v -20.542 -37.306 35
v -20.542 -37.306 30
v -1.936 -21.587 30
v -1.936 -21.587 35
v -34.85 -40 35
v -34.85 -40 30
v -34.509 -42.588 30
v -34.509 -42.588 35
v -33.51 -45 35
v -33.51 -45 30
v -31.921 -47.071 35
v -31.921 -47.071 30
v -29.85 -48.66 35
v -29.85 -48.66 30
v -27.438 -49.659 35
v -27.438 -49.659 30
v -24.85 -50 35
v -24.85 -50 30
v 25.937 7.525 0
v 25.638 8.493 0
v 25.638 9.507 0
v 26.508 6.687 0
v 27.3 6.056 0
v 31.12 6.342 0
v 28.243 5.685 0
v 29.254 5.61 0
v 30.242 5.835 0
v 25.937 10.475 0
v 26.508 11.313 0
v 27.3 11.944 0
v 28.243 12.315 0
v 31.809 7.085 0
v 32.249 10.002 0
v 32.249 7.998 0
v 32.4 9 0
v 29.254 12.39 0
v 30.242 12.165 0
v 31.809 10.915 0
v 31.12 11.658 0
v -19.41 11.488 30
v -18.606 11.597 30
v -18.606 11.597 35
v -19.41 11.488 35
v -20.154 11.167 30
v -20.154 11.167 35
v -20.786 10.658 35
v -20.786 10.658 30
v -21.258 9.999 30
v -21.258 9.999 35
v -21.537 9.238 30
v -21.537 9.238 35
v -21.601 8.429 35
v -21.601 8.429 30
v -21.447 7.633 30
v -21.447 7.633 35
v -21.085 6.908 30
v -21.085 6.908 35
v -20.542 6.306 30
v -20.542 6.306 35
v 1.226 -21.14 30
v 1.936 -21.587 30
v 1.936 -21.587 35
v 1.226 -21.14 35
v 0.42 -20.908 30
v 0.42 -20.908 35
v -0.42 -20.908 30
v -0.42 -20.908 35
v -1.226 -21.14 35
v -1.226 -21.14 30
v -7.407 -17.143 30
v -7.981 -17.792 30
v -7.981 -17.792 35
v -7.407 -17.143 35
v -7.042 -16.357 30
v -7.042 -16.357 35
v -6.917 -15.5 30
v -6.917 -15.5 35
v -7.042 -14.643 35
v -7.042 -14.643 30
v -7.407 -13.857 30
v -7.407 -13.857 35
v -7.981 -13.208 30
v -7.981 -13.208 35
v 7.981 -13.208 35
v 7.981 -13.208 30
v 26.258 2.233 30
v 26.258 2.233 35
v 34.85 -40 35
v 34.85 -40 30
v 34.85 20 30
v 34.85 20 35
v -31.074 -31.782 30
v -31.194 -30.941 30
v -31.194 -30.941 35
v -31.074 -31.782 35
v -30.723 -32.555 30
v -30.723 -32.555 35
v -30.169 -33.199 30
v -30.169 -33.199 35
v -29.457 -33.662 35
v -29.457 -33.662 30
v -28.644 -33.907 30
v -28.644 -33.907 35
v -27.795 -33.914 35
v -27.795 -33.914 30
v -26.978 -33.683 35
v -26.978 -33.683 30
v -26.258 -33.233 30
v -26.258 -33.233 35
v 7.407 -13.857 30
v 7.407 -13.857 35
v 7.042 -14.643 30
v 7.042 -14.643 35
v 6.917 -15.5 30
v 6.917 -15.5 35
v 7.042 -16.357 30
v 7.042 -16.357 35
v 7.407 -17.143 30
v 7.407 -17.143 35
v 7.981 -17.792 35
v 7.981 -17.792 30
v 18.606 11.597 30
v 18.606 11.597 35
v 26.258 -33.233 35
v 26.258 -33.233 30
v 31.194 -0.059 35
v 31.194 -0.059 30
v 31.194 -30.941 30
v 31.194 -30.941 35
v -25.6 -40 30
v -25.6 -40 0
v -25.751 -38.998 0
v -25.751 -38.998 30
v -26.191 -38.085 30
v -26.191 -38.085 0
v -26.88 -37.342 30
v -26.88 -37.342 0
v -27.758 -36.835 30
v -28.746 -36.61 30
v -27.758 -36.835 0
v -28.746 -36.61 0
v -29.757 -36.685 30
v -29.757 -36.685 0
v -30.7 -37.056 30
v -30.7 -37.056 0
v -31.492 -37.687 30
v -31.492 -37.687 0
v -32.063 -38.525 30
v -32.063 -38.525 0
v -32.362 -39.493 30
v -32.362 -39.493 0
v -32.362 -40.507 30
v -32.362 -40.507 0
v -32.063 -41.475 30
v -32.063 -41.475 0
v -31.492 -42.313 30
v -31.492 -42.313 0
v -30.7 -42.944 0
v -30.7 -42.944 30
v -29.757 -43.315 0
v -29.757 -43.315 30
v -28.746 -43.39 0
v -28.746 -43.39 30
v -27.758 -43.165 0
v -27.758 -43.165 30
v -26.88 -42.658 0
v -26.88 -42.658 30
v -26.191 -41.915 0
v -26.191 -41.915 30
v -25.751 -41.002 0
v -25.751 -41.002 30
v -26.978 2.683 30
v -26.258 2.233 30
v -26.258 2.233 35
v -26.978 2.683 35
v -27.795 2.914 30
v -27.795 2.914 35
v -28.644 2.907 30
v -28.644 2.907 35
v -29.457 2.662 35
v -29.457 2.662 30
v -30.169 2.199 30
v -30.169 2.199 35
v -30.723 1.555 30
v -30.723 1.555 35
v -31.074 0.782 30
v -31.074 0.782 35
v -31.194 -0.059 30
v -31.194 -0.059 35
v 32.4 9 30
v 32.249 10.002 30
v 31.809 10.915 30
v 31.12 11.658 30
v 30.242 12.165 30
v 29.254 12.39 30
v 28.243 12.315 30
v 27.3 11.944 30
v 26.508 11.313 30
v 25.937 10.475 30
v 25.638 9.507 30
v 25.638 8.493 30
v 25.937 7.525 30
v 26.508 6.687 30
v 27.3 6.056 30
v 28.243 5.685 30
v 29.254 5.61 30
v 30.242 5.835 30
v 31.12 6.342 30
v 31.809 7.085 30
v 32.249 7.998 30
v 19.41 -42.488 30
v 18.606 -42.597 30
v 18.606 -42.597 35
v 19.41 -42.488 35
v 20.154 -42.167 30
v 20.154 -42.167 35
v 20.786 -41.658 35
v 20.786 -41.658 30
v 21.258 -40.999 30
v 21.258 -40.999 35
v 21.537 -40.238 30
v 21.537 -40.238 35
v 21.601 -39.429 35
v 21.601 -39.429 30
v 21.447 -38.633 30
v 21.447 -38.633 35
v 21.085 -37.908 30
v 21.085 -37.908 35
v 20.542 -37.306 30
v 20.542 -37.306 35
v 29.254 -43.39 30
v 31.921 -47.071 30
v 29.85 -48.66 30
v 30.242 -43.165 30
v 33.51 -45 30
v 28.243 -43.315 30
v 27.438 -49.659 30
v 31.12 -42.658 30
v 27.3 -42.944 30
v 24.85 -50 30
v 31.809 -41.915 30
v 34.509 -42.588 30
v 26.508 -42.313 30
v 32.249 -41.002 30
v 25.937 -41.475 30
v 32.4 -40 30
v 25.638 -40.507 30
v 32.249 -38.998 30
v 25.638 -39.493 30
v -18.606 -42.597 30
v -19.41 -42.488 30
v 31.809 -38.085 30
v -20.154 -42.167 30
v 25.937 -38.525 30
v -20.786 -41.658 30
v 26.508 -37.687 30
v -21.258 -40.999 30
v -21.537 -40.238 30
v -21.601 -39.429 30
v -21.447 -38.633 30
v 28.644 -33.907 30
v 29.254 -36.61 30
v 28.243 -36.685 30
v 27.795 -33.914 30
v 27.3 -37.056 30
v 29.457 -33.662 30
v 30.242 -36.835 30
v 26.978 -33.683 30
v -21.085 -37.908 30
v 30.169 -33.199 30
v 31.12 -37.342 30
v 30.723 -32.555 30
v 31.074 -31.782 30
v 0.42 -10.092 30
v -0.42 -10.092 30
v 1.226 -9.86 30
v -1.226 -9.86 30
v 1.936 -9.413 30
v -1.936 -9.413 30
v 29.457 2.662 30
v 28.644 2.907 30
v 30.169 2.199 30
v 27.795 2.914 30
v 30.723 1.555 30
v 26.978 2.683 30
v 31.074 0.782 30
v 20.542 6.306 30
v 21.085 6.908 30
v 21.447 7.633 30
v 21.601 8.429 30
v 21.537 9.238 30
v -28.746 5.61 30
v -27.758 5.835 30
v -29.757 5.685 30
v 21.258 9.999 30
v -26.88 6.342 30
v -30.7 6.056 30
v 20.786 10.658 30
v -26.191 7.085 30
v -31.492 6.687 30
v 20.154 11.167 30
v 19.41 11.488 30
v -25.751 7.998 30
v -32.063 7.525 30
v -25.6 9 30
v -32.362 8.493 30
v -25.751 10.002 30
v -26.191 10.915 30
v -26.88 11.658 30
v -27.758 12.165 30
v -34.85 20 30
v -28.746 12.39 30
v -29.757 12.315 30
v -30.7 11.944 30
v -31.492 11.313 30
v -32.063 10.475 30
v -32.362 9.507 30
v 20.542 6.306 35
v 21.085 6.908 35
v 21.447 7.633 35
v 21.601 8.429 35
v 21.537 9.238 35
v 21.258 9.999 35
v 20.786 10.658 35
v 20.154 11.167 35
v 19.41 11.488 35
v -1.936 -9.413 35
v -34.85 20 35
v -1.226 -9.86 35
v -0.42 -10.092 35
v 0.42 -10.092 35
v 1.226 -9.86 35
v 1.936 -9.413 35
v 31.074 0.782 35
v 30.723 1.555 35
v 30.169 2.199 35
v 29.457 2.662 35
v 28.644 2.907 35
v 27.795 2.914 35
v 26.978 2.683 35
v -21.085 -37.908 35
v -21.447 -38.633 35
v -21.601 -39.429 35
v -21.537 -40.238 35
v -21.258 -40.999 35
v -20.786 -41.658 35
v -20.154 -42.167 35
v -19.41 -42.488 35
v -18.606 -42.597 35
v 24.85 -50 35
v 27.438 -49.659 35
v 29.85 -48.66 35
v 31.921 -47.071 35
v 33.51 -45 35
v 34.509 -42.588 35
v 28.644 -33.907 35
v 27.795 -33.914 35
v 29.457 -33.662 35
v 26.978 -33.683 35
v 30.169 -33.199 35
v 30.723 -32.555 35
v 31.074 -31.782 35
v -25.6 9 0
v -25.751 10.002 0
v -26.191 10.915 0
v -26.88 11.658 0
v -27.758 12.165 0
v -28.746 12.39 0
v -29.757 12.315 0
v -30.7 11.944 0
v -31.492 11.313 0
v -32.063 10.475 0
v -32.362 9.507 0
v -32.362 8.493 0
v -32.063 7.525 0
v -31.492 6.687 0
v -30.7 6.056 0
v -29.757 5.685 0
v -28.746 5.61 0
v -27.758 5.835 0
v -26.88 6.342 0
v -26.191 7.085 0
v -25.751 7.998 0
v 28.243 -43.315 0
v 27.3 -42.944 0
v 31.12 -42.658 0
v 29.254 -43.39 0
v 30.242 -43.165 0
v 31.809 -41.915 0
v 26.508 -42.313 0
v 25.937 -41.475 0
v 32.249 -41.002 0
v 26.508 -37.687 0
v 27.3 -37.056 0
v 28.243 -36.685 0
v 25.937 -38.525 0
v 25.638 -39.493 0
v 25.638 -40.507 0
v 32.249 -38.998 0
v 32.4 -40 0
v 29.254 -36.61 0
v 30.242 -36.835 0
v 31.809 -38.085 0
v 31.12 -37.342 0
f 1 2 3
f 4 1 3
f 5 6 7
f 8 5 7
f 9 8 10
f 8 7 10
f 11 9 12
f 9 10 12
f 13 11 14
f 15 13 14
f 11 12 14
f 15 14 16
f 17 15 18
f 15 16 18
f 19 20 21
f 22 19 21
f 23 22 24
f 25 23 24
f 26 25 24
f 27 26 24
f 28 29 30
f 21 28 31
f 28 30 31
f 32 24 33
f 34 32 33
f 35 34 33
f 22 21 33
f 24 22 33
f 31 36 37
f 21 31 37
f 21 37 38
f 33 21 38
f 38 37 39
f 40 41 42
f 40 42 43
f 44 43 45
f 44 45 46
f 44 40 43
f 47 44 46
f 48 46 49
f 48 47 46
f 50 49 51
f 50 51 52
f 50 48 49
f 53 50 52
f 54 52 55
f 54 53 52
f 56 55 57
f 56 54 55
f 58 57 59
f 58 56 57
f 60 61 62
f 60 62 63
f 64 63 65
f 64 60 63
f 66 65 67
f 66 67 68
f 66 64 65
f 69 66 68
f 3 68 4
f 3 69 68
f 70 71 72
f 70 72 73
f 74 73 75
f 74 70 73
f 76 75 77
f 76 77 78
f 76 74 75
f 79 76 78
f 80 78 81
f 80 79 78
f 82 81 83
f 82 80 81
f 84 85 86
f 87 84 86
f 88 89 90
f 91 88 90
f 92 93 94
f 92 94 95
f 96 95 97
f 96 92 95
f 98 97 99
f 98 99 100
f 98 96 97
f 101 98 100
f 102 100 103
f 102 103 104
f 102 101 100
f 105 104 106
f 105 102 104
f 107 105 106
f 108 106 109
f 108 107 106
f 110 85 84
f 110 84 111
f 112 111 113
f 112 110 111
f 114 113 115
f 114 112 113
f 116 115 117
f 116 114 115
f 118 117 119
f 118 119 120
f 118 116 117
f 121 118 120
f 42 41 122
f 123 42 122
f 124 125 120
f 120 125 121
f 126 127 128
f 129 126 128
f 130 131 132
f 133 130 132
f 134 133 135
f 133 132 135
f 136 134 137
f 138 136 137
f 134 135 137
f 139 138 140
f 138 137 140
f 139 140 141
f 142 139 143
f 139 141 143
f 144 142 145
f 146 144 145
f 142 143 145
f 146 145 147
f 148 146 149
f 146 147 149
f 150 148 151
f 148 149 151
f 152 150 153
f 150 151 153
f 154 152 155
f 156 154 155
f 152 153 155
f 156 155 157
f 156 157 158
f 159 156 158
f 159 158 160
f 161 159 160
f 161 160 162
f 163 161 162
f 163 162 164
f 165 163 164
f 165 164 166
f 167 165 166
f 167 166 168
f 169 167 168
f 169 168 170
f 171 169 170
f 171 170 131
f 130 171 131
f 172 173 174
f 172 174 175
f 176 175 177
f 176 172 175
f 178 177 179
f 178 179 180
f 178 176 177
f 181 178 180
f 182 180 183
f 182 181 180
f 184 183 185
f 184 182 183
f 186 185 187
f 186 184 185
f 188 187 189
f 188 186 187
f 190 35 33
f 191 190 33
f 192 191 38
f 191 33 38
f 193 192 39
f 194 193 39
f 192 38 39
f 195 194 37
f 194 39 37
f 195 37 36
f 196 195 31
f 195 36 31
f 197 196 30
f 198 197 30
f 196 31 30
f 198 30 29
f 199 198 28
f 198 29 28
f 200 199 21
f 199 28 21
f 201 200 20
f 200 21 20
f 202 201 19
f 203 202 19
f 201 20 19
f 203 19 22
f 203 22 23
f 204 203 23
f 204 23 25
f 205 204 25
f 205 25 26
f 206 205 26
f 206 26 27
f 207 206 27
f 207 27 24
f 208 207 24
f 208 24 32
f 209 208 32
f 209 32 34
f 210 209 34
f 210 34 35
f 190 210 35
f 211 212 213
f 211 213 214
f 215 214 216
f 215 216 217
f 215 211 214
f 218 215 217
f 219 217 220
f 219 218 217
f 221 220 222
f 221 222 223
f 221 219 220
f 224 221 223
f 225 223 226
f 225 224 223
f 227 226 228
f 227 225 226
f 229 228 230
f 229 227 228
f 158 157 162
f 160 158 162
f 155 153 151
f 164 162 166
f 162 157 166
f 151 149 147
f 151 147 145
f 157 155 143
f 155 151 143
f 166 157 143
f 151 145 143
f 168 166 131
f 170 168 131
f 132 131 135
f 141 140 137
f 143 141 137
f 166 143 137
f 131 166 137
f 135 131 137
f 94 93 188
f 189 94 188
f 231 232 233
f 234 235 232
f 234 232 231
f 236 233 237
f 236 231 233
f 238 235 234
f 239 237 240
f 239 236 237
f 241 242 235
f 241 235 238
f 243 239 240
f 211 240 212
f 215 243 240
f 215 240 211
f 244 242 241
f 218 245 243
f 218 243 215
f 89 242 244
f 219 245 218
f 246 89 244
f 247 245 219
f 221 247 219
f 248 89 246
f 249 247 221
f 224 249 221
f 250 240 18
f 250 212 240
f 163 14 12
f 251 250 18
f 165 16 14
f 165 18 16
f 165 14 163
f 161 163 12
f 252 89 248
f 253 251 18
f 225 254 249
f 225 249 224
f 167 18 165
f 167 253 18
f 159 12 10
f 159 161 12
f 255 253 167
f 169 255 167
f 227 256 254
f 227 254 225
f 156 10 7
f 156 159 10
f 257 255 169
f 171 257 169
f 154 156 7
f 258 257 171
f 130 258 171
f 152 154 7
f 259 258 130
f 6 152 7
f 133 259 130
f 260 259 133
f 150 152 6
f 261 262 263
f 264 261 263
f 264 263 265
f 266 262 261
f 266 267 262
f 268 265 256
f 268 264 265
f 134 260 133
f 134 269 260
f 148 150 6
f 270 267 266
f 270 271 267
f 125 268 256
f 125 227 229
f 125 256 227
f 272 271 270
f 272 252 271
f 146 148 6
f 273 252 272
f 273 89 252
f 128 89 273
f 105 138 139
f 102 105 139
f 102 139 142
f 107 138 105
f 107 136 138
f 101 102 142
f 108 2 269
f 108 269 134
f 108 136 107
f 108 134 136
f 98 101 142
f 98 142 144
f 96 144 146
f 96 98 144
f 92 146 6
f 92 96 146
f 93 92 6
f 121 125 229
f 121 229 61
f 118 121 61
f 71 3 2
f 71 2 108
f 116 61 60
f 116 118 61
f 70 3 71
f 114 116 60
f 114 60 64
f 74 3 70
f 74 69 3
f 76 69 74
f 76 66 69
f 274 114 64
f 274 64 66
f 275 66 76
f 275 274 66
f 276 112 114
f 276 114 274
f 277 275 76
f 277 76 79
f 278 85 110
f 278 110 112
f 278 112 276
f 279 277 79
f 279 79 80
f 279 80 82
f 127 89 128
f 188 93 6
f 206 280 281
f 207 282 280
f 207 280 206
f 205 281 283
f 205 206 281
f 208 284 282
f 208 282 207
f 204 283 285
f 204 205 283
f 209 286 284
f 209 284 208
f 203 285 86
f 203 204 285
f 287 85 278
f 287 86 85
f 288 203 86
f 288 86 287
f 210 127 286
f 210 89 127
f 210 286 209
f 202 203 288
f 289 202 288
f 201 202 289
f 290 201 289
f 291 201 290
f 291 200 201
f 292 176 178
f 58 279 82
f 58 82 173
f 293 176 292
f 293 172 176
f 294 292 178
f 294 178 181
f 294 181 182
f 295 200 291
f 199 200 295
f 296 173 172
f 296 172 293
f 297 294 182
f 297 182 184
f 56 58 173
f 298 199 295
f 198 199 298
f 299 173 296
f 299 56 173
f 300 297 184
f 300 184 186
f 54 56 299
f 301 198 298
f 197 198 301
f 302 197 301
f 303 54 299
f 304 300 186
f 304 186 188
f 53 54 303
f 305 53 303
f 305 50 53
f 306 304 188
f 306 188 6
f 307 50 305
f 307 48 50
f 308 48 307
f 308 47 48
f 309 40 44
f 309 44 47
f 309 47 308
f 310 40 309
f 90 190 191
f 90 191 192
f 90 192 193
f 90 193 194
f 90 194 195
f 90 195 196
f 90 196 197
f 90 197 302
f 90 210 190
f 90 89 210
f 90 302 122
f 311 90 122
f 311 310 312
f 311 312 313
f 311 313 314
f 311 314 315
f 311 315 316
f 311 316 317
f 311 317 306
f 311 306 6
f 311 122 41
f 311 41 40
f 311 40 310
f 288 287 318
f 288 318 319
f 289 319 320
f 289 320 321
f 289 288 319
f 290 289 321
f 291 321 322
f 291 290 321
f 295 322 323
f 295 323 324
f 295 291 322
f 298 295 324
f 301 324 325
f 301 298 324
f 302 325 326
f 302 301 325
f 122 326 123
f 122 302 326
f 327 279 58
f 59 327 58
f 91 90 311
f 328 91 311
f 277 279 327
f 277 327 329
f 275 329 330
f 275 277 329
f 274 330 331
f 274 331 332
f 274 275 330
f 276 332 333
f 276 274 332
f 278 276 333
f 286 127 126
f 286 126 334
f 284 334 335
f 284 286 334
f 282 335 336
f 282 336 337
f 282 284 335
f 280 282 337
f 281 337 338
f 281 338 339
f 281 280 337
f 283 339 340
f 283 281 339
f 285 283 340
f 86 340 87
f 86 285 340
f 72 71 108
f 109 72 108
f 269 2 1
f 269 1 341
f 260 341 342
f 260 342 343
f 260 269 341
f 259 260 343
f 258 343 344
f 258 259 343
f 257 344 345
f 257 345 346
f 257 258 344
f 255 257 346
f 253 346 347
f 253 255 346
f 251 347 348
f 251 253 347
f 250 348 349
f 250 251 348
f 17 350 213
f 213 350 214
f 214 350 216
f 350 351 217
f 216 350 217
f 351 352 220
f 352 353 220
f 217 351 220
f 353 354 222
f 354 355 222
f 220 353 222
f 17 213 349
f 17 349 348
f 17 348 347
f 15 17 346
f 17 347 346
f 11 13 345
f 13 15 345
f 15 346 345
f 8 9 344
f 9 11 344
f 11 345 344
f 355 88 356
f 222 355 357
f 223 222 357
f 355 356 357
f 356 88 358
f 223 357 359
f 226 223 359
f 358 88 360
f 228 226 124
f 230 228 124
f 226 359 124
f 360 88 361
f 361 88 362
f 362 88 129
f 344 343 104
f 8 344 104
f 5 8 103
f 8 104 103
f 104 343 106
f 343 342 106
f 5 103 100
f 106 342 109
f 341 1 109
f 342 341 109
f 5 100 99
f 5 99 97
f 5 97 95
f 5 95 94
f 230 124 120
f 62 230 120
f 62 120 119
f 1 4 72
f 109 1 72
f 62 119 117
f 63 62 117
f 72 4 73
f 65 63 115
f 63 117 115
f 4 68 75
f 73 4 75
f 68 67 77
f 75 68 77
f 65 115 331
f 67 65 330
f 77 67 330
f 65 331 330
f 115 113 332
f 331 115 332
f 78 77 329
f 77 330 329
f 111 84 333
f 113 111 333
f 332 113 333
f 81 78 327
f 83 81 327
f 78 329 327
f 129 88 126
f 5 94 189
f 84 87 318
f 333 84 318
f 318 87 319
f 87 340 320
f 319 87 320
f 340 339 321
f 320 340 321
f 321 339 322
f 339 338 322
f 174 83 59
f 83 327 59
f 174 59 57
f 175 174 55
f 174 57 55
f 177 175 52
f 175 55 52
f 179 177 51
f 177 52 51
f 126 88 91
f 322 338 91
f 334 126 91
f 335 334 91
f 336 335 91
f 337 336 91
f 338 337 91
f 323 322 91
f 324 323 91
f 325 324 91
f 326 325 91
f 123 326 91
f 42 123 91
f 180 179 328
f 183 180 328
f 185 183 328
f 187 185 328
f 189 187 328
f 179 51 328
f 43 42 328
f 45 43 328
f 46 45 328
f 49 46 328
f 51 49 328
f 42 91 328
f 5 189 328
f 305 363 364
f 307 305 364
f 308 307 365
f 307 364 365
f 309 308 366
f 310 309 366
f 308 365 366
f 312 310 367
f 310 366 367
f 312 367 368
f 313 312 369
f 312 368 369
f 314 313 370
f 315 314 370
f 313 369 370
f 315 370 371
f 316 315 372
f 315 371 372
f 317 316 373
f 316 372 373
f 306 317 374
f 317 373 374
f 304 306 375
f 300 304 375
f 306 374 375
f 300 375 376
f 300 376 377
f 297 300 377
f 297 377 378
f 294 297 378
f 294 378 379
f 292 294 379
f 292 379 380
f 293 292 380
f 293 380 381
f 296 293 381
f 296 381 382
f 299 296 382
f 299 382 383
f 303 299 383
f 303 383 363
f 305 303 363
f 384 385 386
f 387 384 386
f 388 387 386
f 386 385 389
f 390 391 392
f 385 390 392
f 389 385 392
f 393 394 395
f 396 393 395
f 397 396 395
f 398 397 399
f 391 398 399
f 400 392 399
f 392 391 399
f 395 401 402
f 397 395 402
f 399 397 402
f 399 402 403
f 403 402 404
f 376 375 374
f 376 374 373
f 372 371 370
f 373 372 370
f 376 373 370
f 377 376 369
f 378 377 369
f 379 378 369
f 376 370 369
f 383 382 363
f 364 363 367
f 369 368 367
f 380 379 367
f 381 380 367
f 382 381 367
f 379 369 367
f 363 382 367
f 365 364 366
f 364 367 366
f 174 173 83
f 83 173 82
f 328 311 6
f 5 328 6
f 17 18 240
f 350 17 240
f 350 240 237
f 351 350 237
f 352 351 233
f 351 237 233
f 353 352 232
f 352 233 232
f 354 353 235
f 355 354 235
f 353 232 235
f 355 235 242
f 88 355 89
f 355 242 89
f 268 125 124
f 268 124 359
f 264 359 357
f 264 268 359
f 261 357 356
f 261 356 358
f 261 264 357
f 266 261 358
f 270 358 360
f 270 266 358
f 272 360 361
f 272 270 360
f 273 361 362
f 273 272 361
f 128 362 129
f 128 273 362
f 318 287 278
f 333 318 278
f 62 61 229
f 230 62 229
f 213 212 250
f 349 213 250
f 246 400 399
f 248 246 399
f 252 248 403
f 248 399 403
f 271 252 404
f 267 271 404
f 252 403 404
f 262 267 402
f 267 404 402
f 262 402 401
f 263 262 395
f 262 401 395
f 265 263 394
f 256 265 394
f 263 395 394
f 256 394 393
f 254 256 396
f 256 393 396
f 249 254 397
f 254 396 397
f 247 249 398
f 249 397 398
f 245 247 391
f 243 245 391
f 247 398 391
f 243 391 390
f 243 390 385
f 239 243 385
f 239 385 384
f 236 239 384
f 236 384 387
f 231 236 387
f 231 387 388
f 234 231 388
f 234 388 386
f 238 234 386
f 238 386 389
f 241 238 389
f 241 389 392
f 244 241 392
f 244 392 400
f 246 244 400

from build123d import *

# Parameters (mm, degrees)
SKETCH1_R             = 3.4
BOSS_EXTRUDE1_DEPTH   = 30
BOSS_EXTRUDE1_2_DEPTH = 30
BOSS_EXTRUDE1_3_DEPTH = 30
BOSS_EXTRUDE1_4_DEPTH = 30
BOSS_EXTRUDE2_DEPTH   = 5
CUT_EXTRUDE1_REACH    = 69.93
FILLET1_R             = 3


with BuildPart() as part:
    # Sketch1 → Boss-Extrude1 (new body)
    with BuildSketch(Plane.XY):
        with Locations((29, -40)):
            Circle(SKETCH1_R)
    extrude(amount=BOSS_EXTRUDE1_DEPTH)



with BuildPart() as body_2:
    # Sketch1 → Boss-Extrude1 2 (new body)
    with BuildSketch(Plane.XY):
        with Locations((-29, -40)):
            Circle(SKETCH1_R)
    extrude(amount=BOSS_EXTRUDE1_2_DEPTH)


with BuildPart() as body_3:
    # Sketch1 → Boss-Extrude1 3 (new body)
    with BuildSketch(Plane.XY):
        with Locations((-29, 9)):
            Circle(SKETCH1_R)
    extrude(amount=BOSS_EXTRUDE1_3_DEPTH)


with BuildPart() as body_4:
    # Sketch1 → Boss-Extrude1 4 (new body)
    with BuildSketch(Plane.XY):
        with Locations((29, 9)):
            Circle(SKETCH1_R)
    extrude(amount=BOSS_EXTRUDE1_4_DEPTH)


with BuildPart() as part_1:
    add(part.part)

    add(body_2.part)  # Boss-Extrude2 merges body 2

    add(body_3.part)  # Boss-Extrude2 merges body 3

    add(body_4.part)  # Boss-Extrude2 merges body 4
    # Sketch2 → Boss-Extrude2 (add)
    with BuildSketch(Plane.XY.offset(30)):
        with BuildLine():
            Line((-24.85, -50), (24.85, -50))
            ThreePointArc((24.85, -50), (31.921067812, -47.071067812), (34.85, -40))
            Line((34.85, -40), (34.85, 20))
            Line((34.85, 20), (-34.85, 20))
            Line((-34.85, 20), (-34.85, -40))
            ThreePointArc((-34.85, -40), (-31.921067812, -47.071067812), (-24.85, -50))
        make_face()
    extrude(amount=BOSS_EXTRUDE2_DEPTH)

    # Sketch3 → Cut-Extrude1 (cut, up to next)
    with BuildSketch(Plane(origin=(0, 0, 30), x_dir=(-1, 0, 0), z_dir=(0, 0, -1)), mode=Mode.PRIVATE) as cut_extrude1_sk1:
        Polygon((-5.268445512, -15.5), (-31.194195607, 6.402788873), (-31.194195607, -37.402788873), align=None)
    cut_extrude1_tool1 = extrude(cut_extrude1_sk1.sketch, amount=-CUT_EXTRUDE1_REACH, mode=Mode.PRIVATE) & part_1.part
    # Sketch3 → Cut-Extrude1 (cut, up to next)
    with BuildSketch(Plane(origin=(0, 0, 30), x_dir=(-1, 0, 0), z_dir=(0, 0, -1)), mode=Mode.PRIVATE) as cut_extrude1_sk2:
        Polygon((26.805804393, 11.597211127), (-26.805804393, 11.597211127), (0, -11.049071895), align=None)
    cut_extrude1_tool2 = extrude(cut_extrude1_sk2.sketch, amount=-CUT_EXTRUDE1_REACH, mode=Mode.PRIVATE) & part_1.part
    # Sketch3 → Cut-Extrude1 (cut, up to next)
    with BuildSketch(Plane(origin=(0, 0, 30), x_dir=(-1, 0, 0), z_dir=(0, 0, -1)), mode=Mode.PRIVATE) as cut_extrude1_sk3:
        Polygon((31.194195607, 6.402788873), (5.268445512, -15.5), (31.194195607, -37.402788873), align=None)
    cut_extrude1_tool3 = extrude(cut_extrude1_sk3.sketch, amount=-CUT_EXTRUDE1_REACH, mode=Mode.PRIVATE) & part_1.part
    # Sketch3 → Cut-Extrude1 (cut, up to next)
    with BuildSketch(Plane(origin=(0, 0, 30), x_dir=(-1, 0, 0), z_dir=(0, 0, -1)), mode=Mode.PRIVATE) as cut_extrude1_sk4:
        Polygon((26.805804393, -42.597211127), (0, -19.950928105), (-26.805804393, -42.597211127), align=None)
    cut_extrude1_tool4 = extrude(cut_extrude1_sk4.sketch, amount=-CUT_EXTRUDE1_REACH, mode=Mode.PRIVATE) & part_1.part
    add(cut_extrude1_tool1.solids().sort_by_distance((22.552279, -15.5, 30))[0], mode=Mode.SUBTRACT)
    add(cut_extrude1_tool2.solids().sort_by_distance((0, 4.04845, 30))[0], mode=Mode.SUBTRACT)
    add(cut_extrude1_tool3.solids().sort_by_distance((-22.552279, -15.5, 30))[0], mode=Mode.SUBTRACT)
    add(cut_extrude1_tool4.solids().sort_by_distance((0, -35.04845, 30))[0], mode=Mode.SUBTRACT)

    # Fillet1
    # the kernel refuses this fillet: 3 mm, written as the material it adds along each edge
    with BuildSketch(Plane(origin=(-31.194195607, 6.402788873, 30), x_dir=(0, -1, 0), z_dir=(0, 0, 1)), Plane(origin=(31.194195607, -37.402788873, 30), x_dir=(0, 1, 0), z_dir=(0, 0, 1))) as fillet1_piece_1:
        with BuildLine():
            CenterArc((FILLET1_R * 2.15392408777, FILLET1_R), FILLET1_R, 139.807953963, 130.192046037)
            Line((FILLET1_R * 1.39003846223, FILLET1_R * 1.64535164917), (0, 0))
            Line((0, 0), (FILLET1_R * 2.15392408777, 0))
        make_face()
    extrude(amount=5)
    with BuildSketch(Plane(origin=(-31.194195607, -37.402788873, 30), x_dir=(0, 1, 0), z_dir=(0, 0, 1)), Plane(origin=(31.194195607, 6.402788873, 30), x_dir=(0, -1, 0), z_dir=(0, 0, 1))) as fillet1_piece_2:
        with BuildLine():
            CenterArc((FILLET1_R * 2.15392408777, -FILLET1_R), FILLET1_R, 90, 130.192046037)
            Line((FILLET1_R * 1.39003846223, -FILLET1_R * 1.64535164917), (0, 0))
            Line((0, 0), (FILLET1_R * 2.15392408777, 0))
        make_face()
    extrude(amount=5)
    with BuildSketch(Plane(origin=(-5.268445512, -15.5, 30), x_dir=(-0.7638856255460464, -0.6453516491682078, 0), z_dir=(0, 0, 1))) as fillet1_piece_3:
        with BuildLine():
            CenterArc((FILLET1_R * 1.18367346939, -FILLET1_R), FILLET1_R, 90, 99.615907926)
            Line((FILLET1_R * 0.197723772944, -FILLET1_R * 1.16704249783), (0, 0))
            Line((0, 0), (FILLET1_R * 1.18367346939, 0))
        make_face()
    extrude(amount=5)
    with BuildSketch(Plane(origin=(-26.805804393, 11.597211127, 30), x_dir=(1, 0, 0), z_dir=(0, 0, 1)), Plane(origin=(26.805804393, -42.597211127, 30), x_dir=(-1, 0, 0), z_dir=(0, 0, 1))) as fillet1_piece_4:
        with BuildLine():
            CenterArc((FILLET1_R * 2.73321626716, -FILLET1_R), FILLET1_R, 90, 139.807953963)
            Line((FILLET1_R * 2.08786461799, -FILLET1_R * 1.76388562555), (0, 0))
            Line((0, 0), (FILLET1_R * 2.73321626716, 0))
        make_face()
    extrude(amount=5)
    with BuildSketch(Plane(origin=(0, -11.049071895, 30), x_dir=(0.7638856255460464, 0.6453516491682076, 0), z_dir=(0, 0, 1))) as fillet1_piece_5:
        with BuildLine():
            CenterArc((FILLET1_R * 0.844827586207, FILLET1_R), FILLET1_R, 189.615907926, 80.384092074)
            Line((-FILLET1_R * 0.141122110237, FILLET1_R * 0.832957502168), (0, 0))
            Line((0, 0), (FILLET1_R * 0.844827586207, 0))
        make_face()
    extrude(amount=5)
    with BuildSketch(Plane(origin=(26.805804393, 11.597211127, 30), x_dir=(-1, 0, 0), z_dir=(0, 0, 1)), Plane(origin=(-26.805804393, -42.597211127, 30), x_dir=(1, 0, 0), z_dir=(0, 0, 1))) as fillet1_piece_6:
        with BuildLine():
            CenterArc((FILLET1_R * 2.73321626716, FILLET1_R), FILLET1_R, 130.192046037, 139.807953963)
            Line((FILLET1_R * 2.08786461799, FILLET1_R * 1.76388562555), (0, 0))
            Line((0, 0), (FILLET1_R * 2.73321626716, 0))
        make_face()
    extrude(amount=5)
    with BuildSketch(Plane(origin=(0, -19.950928105, 30), x_dir=(0.7638856255460446, -0.6453516491682099, 0), z_dir=(0, 0, 1))) as fillet1_piece_7:
        with BuildLine():
            CenterArc((FILLET1_R * 0.844827586207, -FILLET1_R), FILLET1_R, 90, 80.384092074)
            Line((-FILLET1_R * 0.141122110237, -FILLET1_R * 0.832957502168), (0, 0))
            Line((0, 0), (FILLET1_R * 0.844827586207, 0))
        make_face()
    extrude(amount=5)
    with BuildSketch(Plane(origin=(5.268445512, -15.5, 30), x_dir=(0.7638856255460458, -0.6453516491682085, 0), z_dir=(0, 0, 1))) as fillet1_piece_8:
        with BuildLine():
            CenterArc((FILLET1_R * 1.18367346939, FILLET1_R), FILLET1_R, 170.384092074, 99.615907926)
            Line((FILLET1_R * 0.197723772944, FILLET1_R * 1.16704249783), (0, 0))
            Line((0, 0), (FILLET1_R * 1.18367346939, 0))
        make_face()
    extrude(amount=5)


solid = part_1.part
